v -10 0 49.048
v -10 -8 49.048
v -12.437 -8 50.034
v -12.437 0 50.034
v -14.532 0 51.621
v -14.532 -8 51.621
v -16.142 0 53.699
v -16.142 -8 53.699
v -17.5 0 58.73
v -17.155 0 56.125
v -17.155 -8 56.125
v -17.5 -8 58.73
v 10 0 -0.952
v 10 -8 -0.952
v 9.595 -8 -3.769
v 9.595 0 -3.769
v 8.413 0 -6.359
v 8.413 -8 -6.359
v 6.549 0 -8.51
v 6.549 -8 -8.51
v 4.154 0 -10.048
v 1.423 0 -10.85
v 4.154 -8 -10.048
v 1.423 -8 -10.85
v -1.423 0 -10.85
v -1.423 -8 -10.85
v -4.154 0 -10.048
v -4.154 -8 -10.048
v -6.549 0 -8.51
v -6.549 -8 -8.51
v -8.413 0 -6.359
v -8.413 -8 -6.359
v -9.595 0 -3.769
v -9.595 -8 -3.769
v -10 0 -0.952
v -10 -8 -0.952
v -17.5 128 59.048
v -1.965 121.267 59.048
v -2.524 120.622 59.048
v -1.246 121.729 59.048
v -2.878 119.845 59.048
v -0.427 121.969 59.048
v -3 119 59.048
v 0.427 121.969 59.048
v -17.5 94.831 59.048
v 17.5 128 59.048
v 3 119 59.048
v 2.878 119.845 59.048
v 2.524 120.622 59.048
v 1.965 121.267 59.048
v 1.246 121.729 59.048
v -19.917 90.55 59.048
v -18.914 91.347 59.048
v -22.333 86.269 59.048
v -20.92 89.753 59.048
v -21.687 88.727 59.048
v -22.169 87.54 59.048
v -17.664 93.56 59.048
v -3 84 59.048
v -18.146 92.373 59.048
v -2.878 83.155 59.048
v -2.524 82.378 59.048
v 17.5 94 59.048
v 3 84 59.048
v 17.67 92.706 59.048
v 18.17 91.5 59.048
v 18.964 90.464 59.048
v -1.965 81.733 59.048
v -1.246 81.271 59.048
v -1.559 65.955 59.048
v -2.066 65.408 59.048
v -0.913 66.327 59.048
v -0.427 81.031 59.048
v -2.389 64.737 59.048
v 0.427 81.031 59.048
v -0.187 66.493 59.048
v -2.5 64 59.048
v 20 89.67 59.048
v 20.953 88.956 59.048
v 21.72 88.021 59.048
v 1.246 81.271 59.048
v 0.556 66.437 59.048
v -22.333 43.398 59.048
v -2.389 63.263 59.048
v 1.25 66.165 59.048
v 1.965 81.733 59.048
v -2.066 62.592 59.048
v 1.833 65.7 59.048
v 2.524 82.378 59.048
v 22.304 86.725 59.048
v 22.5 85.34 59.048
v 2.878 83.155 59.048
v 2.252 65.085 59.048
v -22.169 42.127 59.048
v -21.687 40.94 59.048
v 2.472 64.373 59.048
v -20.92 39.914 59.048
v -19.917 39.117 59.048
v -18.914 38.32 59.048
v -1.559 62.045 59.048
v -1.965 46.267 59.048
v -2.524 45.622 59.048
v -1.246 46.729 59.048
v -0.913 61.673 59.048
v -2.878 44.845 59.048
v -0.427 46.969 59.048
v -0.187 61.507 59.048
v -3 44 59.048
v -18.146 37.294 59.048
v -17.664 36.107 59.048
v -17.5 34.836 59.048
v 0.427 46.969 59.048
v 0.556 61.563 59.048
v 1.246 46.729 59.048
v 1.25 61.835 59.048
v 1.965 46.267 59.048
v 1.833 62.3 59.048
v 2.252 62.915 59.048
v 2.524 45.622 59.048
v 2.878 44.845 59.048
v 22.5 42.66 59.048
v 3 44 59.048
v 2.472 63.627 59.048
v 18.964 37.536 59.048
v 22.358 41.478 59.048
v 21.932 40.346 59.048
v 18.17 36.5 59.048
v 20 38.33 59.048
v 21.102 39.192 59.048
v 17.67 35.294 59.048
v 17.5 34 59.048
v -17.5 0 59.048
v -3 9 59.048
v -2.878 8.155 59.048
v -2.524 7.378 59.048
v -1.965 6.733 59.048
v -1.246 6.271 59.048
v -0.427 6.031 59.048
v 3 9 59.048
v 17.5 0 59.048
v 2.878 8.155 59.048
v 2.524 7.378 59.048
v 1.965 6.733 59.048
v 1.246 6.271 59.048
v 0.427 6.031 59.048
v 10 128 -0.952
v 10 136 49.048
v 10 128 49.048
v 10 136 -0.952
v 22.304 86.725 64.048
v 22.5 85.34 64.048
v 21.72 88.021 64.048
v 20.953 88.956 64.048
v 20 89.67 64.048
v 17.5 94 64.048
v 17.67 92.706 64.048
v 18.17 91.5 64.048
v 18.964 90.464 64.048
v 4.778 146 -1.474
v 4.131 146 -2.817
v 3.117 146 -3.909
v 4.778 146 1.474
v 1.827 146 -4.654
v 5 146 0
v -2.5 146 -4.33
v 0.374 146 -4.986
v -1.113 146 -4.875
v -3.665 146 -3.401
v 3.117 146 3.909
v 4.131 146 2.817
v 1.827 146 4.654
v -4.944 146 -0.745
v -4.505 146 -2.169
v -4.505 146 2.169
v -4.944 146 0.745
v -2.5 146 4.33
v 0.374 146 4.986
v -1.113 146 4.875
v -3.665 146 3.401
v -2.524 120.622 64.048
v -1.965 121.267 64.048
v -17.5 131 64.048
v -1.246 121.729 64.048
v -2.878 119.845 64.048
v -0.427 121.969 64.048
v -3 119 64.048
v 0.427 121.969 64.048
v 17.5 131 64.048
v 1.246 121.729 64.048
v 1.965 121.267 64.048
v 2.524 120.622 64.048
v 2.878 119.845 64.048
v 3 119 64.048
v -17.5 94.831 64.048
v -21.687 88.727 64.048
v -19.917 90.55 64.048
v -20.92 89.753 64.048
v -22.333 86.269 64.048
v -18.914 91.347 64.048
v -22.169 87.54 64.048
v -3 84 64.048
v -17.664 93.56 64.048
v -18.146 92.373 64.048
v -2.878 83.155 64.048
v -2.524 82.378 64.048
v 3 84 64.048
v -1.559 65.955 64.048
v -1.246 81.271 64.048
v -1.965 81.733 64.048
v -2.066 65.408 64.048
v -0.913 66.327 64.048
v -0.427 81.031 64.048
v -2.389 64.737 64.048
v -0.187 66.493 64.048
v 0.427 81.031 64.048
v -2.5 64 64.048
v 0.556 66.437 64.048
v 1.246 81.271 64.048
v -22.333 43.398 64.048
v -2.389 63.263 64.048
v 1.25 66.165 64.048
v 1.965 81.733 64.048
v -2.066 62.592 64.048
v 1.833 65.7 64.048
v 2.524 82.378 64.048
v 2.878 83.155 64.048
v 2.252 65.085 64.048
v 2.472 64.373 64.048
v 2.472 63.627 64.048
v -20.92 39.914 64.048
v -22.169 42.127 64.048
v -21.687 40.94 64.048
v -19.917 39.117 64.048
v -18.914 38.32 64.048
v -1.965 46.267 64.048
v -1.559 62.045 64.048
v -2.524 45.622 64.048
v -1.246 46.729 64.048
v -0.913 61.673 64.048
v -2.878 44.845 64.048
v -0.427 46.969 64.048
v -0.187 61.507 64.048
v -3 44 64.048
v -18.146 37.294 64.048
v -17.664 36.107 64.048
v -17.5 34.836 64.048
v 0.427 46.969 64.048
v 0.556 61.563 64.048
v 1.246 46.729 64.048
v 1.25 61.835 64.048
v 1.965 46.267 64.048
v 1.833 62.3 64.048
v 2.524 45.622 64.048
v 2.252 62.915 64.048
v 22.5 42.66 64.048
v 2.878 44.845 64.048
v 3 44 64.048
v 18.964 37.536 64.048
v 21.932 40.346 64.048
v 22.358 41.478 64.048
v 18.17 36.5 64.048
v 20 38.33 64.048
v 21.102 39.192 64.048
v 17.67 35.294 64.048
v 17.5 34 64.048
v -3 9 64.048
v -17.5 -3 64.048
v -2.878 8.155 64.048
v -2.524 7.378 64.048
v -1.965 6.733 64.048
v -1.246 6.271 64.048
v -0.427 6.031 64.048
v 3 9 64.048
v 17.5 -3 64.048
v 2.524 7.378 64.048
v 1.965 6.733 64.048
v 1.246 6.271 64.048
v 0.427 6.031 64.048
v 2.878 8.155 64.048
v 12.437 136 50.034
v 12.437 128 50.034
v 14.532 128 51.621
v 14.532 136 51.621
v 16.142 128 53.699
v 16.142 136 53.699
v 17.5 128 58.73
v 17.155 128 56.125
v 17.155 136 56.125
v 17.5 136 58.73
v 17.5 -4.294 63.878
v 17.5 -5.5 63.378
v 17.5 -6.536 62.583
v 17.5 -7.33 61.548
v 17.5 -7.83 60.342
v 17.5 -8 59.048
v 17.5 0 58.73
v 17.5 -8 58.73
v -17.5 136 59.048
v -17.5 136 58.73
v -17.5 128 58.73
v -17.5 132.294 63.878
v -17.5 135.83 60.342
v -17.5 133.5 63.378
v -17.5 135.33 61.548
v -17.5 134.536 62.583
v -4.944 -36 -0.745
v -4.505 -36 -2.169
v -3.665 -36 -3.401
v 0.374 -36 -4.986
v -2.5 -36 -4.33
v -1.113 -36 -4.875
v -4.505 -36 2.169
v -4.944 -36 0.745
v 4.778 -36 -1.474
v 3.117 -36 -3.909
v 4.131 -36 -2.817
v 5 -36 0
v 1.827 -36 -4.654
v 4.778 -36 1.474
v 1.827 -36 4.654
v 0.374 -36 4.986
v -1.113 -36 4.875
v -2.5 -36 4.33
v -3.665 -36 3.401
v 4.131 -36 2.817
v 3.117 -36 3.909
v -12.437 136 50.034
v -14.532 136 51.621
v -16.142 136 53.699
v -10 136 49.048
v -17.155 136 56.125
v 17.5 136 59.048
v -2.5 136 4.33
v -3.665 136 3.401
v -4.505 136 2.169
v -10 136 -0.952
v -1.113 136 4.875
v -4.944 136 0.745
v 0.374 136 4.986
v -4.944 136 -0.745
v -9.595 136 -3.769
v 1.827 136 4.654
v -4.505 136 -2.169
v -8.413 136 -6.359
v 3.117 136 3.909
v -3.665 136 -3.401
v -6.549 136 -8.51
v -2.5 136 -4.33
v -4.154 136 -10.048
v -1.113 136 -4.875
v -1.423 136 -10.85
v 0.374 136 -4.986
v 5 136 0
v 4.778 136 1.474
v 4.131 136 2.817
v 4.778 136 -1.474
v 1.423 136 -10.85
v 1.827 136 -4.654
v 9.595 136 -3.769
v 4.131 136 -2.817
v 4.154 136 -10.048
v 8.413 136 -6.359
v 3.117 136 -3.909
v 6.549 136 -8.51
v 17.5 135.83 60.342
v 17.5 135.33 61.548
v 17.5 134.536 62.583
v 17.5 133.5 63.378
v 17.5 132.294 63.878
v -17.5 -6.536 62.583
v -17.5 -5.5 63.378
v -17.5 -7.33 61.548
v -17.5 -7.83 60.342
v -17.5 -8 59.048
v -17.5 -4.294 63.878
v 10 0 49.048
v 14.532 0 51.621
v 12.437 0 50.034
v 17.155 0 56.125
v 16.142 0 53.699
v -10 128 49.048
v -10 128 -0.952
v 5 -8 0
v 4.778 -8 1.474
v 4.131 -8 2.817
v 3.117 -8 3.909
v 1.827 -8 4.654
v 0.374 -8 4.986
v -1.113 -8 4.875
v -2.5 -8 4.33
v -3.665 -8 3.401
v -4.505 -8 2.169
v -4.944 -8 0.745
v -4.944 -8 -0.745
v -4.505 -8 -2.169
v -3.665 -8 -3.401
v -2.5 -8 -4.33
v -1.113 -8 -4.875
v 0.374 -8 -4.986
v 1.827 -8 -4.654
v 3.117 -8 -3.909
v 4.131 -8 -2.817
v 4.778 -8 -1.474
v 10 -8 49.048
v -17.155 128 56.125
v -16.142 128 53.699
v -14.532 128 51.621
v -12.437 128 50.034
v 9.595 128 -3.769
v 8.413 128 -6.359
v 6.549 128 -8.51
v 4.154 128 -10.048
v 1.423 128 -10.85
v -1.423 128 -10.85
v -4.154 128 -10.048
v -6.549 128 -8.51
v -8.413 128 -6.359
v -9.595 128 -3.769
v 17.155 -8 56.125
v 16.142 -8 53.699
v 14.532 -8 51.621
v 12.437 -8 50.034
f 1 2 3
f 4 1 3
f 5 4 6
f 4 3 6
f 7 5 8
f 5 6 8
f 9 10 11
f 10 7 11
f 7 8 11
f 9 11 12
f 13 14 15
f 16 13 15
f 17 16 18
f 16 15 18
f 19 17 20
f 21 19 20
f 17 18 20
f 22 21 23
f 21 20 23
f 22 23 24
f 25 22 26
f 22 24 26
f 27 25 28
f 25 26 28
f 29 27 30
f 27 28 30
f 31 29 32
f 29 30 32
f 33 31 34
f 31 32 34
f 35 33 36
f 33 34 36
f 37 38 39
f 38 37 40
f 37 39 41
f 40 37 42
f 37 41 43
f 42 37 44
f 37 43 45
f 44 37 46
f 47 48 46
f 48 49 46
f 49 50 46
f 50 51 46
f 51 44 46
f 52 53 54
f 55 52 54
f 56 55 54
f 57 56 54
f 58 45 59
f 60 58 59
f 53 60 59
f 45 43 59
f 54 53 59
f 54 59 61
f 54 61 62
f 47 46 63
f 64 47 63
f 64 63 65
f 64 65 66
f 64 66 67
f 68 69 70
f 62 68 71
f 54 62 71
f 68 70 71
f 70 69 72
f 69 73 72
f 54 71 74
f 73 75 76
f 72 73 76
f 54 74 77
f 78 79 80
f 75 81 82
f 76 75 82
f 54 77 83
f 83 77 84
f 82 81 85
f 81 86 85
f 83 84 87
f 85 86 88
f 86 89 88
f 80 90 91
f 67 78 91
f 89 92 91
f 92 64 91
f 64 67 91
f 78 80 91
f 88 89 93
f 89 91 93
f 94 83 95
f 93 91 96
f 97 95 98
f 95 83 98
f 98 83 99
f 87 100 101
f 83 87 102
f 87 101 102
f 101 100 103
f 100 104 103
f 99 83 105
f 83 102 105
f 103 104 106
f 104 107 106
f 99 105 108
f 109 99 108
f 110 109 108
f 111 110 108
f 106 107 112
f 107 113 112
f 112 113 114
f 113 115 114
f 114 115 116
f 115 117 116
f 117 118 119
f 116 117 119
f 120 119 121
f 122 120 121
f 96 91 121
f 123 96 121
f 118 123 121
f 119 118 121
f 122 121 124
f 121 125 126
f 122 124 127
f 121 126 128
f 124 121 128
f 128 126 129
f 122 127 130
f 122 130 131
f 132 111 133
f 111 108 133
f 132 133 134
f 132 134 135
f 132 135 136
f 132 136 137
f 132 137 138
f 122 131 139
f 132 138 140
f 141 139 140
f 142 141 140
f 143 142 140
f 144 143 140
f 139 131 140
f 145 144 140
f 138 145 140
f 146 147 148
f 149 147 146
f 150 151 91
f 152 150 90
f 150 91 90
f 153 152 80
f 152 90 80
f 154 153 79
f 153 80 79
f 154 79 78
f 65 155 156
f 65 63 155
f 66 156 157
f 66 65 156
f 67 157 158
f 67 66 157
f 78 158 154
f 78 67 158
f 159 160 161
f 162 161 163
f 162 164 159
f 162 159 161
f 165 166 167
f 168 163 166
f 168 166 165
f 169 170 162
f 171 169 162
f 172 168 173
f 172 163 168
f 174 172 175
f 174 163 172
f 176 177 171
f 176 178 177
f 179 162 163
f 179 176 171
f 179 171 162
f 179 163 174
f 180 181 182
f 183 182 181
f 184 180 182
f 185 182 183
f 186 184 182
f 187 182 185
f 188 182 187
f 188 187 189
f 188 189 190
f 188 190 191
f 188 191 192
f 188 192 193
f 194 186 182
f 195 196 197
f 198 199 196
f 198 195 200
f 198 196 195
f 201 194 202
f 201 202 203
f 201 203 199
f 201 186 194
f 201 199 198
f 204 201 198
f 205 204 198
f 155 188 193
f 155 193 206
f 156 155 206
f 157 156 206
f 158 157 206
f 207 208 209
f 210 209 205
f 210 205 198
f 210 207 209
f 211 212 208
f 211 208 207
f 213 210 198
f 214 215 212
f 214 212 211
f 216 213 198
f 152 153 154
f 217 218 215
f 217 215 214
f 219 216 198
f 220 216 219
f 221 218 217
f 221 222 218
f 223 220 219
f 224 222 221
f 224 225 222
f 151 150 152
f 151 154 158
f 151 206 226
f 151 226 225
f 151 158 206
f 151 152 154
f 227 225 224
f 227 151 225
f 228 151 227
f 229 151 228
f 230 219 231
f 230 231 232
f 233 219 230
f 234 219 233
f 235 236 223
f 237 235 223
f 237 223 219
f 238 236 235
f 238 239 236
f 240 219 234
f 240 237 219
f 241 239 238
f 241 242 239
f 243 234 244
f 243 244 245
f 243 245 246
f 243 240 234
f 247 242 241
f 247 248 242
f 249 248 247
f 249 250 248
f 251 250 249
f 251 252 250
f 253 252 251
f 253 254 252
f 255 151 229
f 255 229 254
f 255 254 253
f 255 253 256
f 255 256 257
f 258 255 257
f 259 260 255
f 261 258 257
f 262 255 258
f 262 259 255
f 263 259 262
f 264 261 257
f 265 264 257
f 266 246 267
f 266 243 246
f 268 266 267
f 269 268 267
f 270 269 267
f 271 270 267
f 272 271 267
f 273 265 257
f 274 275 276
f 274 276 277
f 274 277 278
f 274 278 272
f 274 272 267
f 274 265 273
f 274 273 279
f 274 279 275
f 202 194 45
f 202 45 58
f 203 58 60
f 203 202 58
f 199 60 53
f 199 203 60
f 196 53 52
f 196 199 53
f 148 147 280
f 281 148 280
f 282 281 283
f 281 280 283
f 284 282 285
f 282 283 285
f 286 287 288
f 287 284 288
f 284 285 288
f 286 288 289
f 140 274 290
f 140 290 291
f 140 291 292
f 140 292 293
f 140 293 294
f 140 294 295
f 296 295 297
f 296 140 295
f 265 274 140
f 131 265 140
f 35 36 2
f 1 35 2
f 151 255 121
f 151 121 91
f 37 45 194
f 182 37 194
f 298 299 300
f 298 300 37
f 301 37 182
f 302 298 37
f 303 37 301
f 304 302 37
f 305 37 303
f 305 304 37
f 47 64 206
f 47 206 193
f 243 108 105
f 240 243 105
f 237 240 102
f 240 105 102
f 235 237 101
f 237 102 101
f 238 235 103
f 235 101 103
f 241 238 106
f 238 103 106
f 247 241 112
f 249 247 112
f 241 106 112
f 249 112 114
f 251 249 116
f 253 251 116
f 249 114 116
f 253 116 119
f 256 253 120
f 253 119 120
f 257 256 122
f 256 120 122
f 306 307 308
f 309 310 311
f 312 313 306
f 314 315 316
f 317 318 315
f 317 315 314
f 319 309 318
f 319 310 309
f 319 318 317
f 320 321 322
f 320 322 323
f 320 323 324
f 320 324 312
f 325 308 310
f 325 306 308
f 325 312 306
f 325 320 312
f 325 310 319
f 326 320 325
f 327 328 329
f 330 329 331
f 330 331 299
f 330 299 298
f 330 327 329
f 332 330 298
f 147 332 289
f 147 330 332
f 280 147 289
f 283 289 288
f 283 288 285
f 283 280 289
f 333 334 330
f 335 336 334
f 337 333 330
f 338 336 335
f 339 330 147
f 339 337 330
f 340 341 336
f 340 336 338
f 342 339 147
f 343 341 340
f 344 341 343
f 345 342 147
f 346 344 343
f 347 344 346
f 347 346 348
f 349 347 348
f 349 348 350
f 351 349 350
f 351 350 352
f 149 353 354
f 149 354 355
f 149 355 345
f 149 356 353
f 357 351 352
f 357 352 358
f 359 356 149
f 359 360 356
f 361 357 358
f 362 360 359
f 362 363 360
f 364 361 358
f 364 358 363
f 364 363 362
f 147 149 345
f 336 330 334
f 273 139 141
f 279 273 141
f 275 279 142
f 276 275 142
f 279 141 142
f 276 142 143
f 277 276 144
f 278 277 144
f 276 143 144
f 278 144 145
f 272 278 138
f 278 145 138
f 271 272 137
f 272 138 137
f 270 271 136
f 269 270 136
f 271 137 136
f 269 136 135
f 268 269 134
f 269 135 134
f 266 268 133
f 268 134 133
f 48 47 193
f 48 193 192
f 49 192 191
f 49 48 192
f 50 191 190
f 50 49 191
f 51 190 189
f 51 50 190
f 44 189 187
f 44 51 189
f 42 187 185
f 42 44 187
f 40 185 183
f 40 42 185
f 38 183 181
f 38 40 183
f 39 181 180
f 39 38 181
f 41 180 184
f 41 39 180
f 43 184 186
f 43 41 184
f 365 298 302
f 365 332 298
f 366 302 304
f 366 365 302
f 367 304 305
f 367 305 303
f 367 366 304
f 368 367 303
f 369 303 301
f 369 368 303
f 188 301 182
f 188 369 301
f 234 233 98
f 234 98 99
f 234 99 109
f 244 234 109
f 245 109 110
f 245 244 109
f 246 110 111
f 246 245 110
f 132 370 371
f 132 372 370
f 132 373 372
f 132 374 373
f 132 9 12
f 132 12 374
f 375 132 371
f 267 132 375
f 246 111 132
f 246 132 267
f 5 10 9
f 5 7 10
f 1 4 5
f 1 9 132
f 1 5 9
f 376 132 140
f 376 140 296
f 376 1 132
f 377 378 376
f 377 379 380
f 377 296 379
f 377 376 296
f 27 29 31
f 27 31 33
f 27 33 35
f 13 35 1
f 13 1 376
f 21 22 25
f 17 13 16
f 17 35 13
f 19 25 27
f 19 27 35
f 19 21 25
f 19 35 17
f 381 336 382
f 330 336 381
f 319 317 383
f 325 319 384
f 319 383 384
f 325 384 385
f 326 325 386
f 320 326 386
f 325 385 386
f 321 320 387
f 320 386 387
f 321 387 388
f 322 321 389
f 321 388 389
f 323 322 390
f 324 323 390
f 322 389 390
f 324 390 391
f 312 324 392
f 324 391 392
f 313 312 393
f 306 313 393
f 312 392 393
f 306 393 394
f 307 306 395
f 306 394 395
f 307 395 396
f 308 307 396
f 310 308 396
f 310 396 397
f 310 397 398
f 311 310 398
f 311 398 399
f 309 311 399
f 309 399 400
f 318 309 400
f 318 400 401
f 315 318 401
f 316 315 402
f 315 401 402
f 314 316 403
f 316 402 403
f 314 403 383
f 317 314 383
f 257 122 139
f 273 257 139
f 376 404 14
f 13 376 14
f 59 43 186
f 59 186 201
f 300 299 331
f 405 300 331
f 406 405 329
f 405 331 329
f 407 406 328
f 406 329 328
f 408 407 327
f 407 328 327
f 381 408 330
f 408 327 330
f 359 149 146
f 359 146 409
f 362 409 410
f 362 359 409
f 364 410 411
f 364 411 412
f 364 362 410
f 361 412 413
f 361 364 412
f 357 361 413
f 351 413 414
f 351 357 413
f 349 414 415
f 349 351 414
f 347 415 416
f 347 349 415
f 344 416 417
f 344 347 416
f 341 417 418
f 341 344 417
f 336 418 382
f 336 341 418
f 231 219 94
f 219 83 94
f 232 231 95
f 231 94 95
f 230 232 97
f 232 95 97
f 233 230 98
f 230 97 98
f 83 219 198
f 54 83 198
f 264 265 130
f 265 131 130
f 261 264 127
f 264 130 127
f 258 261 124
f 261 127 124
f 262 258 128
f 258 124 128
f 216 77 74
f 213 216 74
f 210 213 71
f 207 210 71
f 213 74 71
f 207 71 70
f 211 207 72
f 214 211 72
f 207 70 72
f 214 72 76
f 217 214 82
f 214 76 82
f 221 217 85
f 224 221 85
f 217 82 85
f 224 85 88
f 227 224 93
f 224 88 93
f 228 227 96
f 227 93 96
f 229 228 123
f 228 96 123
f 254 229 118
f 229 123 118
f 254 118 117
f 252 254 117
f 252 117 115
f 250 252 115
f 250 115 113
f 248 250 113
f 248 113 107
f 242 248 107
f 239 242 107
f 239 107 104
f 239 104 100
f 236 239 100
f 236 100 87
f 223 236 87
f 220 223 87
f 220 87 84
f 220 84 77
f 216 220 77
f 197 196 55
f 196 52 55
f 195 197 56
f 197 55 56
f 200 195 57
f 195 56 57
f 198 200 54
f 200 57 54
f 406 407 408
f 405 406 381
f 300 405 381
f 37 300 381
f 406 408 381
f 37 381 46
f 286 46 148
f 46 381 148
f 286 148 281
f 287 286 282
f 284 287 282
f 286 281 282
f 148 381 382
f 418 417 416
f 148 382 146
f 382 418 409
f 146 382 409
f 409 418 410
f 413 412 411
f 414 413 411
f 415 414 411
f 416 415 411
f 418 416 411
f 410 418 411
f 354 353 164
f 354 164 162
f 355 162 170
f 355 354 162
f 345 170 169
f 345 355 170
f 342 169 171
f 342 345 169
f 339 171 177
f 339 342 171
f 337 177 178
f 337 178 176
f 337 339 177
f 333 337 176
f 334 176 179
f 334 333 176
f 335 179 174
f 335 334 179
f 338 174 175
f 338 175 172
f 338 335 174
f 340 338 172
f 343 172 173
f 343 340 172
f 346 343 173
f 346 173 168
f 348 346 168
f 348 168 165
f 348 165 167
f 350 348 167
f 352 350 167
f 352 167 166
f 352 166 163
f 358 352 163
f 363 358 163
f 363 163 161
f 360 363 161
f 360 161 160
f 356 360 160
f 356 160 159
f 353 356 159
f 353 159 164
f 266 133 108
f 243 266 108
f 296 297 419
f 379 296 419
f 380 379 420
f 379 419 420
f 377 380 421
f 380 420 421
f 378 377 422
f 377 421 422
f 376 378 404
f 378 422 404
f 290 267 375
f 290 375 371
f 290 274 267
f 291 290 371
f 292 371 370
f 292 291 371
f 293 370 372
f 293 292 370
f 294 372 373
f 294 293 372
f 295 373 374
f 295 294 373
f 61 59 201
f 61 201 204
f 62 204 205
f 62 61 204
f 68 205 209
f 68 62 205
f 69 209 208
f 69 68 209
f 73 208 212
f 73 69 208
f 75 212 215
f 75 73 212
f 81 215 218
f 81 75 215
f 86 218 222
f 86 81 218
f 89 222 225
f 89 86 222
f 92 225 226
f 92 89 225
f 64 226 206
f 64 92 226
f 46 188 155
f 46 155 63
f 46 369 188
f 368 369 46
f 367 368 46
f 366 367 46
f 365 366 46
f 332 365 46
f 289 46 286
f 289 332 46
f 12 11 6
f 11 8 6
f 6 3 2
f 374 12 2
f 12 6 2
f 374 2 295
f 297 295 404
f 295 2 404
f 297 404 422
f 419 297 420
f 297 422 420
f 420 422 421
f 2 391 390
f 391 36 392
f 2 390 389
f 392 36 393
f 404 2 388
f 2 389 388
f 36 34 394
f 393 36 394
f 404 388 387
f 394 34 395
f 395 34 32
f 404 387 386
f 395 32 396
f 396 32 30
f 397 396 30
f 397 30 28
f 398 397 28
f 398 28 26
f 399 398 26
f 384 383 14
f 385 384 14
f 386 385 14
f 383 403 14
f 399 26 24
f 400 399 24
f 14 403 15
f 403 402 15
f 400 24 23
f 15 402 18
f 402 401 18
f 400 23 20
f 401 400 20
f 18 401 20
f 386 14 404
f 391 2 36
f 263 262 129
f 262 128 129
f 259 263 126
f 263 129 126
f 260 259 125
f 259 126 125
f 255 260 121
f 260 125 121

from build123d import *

# Parameters (mm, degrees)
SKETCH1_W             = 144
SKETCH1_H             = 35
BOSS_EXTRUDE1_DEPTH   = 5
BOSS_EXTRUDE2_DEPTH   = 8
FILLET1_R             = 10
BOSS_EXTRUDE3_DEPTH   = 8
SKETCH5_R             = 5
BOSS_EXTRUDE4_DEPTH   = 28
FILLET1_OF_MIRROR1_R  = 10
FILLET3_R             = 5
SKETCH7_R             = 2.5
CUT_EXTRUDE2_DEPTH    = 28
SKETCH8_R             = 5
CUT_EXTRUDE3_DEPTH    = 18
SKETCH9_W             = 50
SKETCH9_H             = 4.833302034
BOSS_EXTRUDE7_DEPTH   = 5
FILLET6_R             = 5
FILLET7_R             = 5
SKETCH10_W            = 50
SKETCH10_H            = 5
BOSS_EXTRUDE8_DEPTH   = 5
FILLET8_R             = 5
FILLET9_R             = 5
CUT_EXTRUDE6_DEPTH    = 10
BODY_MOVE_COPY1_ANGLE = 120


with BuildPart() as part:
    # Sketch1 → Boss-Extrude1 (new body)
    with BuildSketch(Plane(origin=(0, 0, 0), x_dir=(1, 0, 0), z_dir=(0, 1, 0))):
        Rectangle(SKETCH1_W, SKETCH1_H)
    boss_extrude1 = extrude(amount=BOSS_EXTRUDE1_DEPTH)

    # Sketch3 → Boss-Extrude2 (add)
    with BuildSketch(Plane.ZY.offset(72)):
        Polygon((-17.5, 5), (-17.5, 15), (-10, 15), (-10, 55), (10, 55), (10, 15), (17.5, 15), (17.5, 5), (0, 5), align=None)
    boss_extrude2 = extrude(amount=-BOSS_EXTRUDE2_DEPTH)

    # Fillet1
    # the kernel refuses this fillet: 10 mm, written as the material it takes off along each edge
    with BuildSketch(Plane(origin=(-96.206145914, 15, -17.5), x_dir=(0, -1, 0), z_dir=(1, 0, 0))) as fillet1_piece_1:
        with BuildLine():
            CenterArc((9.682458366, -10), FILLET1_R, 90, 75.522487814)
            Line((0, -7.5), (-0.193649167, -7.45))
            ThreePointArc((-0.193649167, -7.45), (-0.2, -3.75), (-0.2, 0))
            Line((-0.2, 0), (0, 0.2))
            Line((0, 0.2), (9.682458366, 0.2))
            Line((9.682458366, 0.2), (9.682458366, 0))
        make_face()
    extrude(amount=56.412291828, mode=Mode.SUBTRACT)
    with BuildSketch(Plane(origin=(-96.206145914, 15, 17.5), x_dir=(0, -1, 0), z_dir=(1, 0, 0))) as fillet1_piece_2:
        with BuildLine():
            CenterArc((9.682458366, 10), FILLET1_R, 194.477512186, 75.522487814)
            Line((0, 7.5), (-0.193649167, 7.45))
            ThreePointArc((-0.193649167, 7.45), (-0.2, 3.75), (-0.2, 0))
            Line((-0.2, 0), (0, -0.2))
            Line((0, -0.2), (9.682458366, -0.2))
            Line((9.682458366, -0.2), (9.682458366, 0))
        make_face()
    extrude(amount=56.412291828, mode=Mode.SUBTRACT)

    # Sketch4 → Boss-Extrude3 (add)
    with BuildSketch(Plane.ZY.offset(72)):
        with BuildLine():
            Line((-10, 55), (-10, 65))
            ThreePointArc((-10, 65), (0, 75), (10, 65))
            Line((10, 65), (10, 55))
            Line((10, 55), (-10, 55))
        make_face()
    boss_extrude3 = extrude(amount=-BOSS_EXTRUDE3_DEPTH)

    # Sketch5 → Boss-Extrude4 (add)
    with BuildSketch(Plane.ZY.offset(72)):
        with Locations(Location((0, 64.047898896, 0), (0, 0, 180))):
            Circle(SKETCH5_R)
    boss_extrude4 = extrude(amount=BOSS_EXTRUDE4_DEPTH)

    # Mirror1: Boss-Extrude1, Boss-Extrude2, Boss-Extrude3, Boss-Extrude4 across plane
    add(boss_extrude1.mirror(Plane(origin=(0, 0, 0), x_dir=(0, 0, 1), z_dir=(1, 0, 0))))
    add(boss_extrude2.mirror(Plane(origin=(0, 0, 0), x_dir=(0, 0, 1), z_dir=(1, 0, 0))))
    add(boss_extrude3.mirror(Plane(origin=(0, 0, 0), x_dir=(0, 0, 1), z_dir=(1, 0, 0))))
    add(boss_extrude4.mirror(Plane(origin=(0, 0, 0), x_dir=(0, 0, 1), z_dir=(1, 0, 0))))

    # Fillet1 of Mirror1
    # the kernel refuses this fillet: 10 mm, written as the material it takes off along each edge
    with BuildSketch(Plane(origin=(96.206145914, 15, -17.5), x_dir=(0, -1, 0), z_dir=(-1, 0, 0))) as fillet1_of_mirror1_piece_1:
        with BuildLine():
            CenterArc((9.682458366, 10), FILLET1_OF_MIRROR1_R, 194.477512186, 75.522487814)
            Line((0, 7.5), (-0.193649167, 7.45))
            ThreePointArc((-0.193649167, 7.45), (-0.2, 3.75), (-0.2, 0))
            Line((-0.2, 0), (0, -0.2))
            Line((0, -0.2), (9.682458366, -0.2))
            Line((9.682458366, -0.2), (9.682458366, 0))
        make_face()
    extrude(amount=56.412291828, mode=Mode.SUBTRACT)
    with BuildSketch(Plane(origin=(96.206145914, 15, 17.5), x_dir=(0, -1, 0), z_dir=(-1, 0, 0))) as fillet1_of_mirror1_piece_2:
        with BuildLine():
            CenterArc((9.682458366, -10), FILLET1_OF_MIRROR1_R, 90, 75.522487814)
            Line((0, -7.5), (-0.193649167, -7.45))
            ThreePointArc((-0.193649167, -7.45), (-0.2, -3.75), (-0.2, 0))
            Line((-0.2, 0), (0, 0.2))
            Line((0, 0.2), (9.682458366, 0.2))
            Line((9.682458366, 0.2), (9.682458366, 0))
        make_face()
    extrude(amount=56.412291828, mode=Mode.SUBTRACT)

    # Fillet3
    fillet3_edges = [part.edges().sort_by_distance(p)[0] for p in [
        (-72, 0, 0),
        (72, 0, 0),
    ]]
    fillet(fillet3_edges, radius=FILLET3_R)

    # Sketch7 → Cut-Extrude2 (cut)
    with BuildSketch(Plane(origin=(0, 5, 0), x_dir=(1, 0, 0), z_dir=(0, 1, 0))):
        with Locations(Location((0, 0, 0), (0, 0, 270))):
            Circle(SKETCH7_R)
    extrude(amount=-CUT_EXTRUDE2_DEPTH, mode=Mode.SUBTRACT)

    # Sketch8 → Cut-Extrude3 (cut)
    with BuildSketch(Plane(origin=(100, 0, 0), x_dir=(0, 0, -1), z_dir=(1, 0, 0))):
        with Locations(Location((0, 64.047898896, 0), (0, 0, 180))):
            Circle(SKETCH8_R)
    extrude(amount=-CUT_EXTRUDE3_DEPTH, mode=Mode.SUBTRACT)

    # Sketch9 → Boss-Extrude7 (add)
    with BuildSketch(Plane.XZ):
        with Locations((0.833489832, 19.916651017)):
            Rectangle(SKETCH9_W, SKETCH9_H)
    extrude(amount=-BOSS_EXTRUDE7_DEPTH)

    # Fillet6
    # the kernel refuses this fillet: 5 mm, written as the material it adds along each edge
    with BuildSketch(Plane(origin=(-24.166510168, 0, 17.5), x_dir=(-1, 0, 0), z_dir=(0, 1, 0))) as fillet6_piece_1:
        with BuildLine():
            CenterArc((4.997220406, 5), FILLET6_R, 181.91057204, 88.08942796)
            Line((0, 4.833302034), (-0.099944408, 4.829968074))
            ThreePointArc((-0.099944408, 4.829968074), (-0.1, 2.416651017), (-0.1, 0))
            Line((-0.1, 0), (0, -0.1))
            Line((0, -0.1), (4.997220406, -0.1))
            Line((4.997220406, -0.1), (4.997220406, 0))
        make_face()
    extrude(amount=5)
    with BuildSketch(Plane(origin=(25.833489832, 0, 17.5), x_dir=(1, 0, 0), z_dir=(0, 1, 0))) as fillet6_piece_2:
        with BuildLine():
            CenterArc((4.997220406, -5), FILLET6_R, 90, 88.08942796)
            Line((0, -4.833302034), (-0.099944408, -4.829968074))
            ThreePointArc((-0.099944408, -4.829968074), (-0.1, -2.416651017), (-0.1, 0))
            Line((-0.1, 0), (0, 0.1))
            Line((0, 0.1), (4.997220406, 0.1))
            Line((4.997220406, 0.1), (4.997220406, 0))
        make_face()
    extrude(amount=5)

    # Fillet7
    fillet7_edges = [part.edges().sort_by_distance(p)[0] for p in [
        (-24.166510168, 2.5, 22.333302034),
        (25.833489832, 2.5, 22.333302034),
    ]]
    fillet(fillet7_edges, radius=FILLET7_R)

    # Sketch10 → Boss-Extrude8 (add)
    with BuildSketch(Plane.XZ):
        with Locations((0, -20)):
            Rectangle(SKETCH10_W, SKETCH10_H)
    extrude(amount=-BOSS_EXTRUDE8_DEPTH)

    # Fillet8
    fillet8_edges = [part.edges().sort_by_distance(p)[0] for p in [
        (-25, 2.5, -17.5),
        (25, 2.5, -17.5),
    ]]
    fillet(fillet8_edges, radius=FILLET8_R - 0.0001)  # a hair under: the kernel refuses the full size

    # Fillet9
    fillet9_edges = [part.edges().sort_by_distance(p)[0] for p in [
        (-25, 2.5, -22.5),
        (25, 2.5, -22.5),
    ]]
    fillet(fillet9_edges, radius=FILLET9_R)

    # Sketch11 → Cut-Extrude6 (cut)
    with BuildSketch(Plane(origin=(0, 5, 0), x_dir=(1, 0, 0), z_dir=(0, 1, 0))):
        with BuildLine():
            Line((55, -3), (20, -3))
            ThreePointArc((20, -3), (17, 0), (20, 3))
            Line((20, 3), (55, 3))
            ThreePointArc((55, 3), (58, 0), (55, -3))
        make_face()
        with BuildLine():
            Line((-55, -3), (-20, -3))
            ThreePointArc((-20, -3), (-17, 0), (-20, 3))
            Line((-20, 3), (-55, 3))
            ThreePointArc((-55, 3), (-58, 0), (-55, -3))
        make_face()
    extrude(amount=-CUT_EXTRUDE6_DEPTH, mode=Mode.SUBTRACT)


with BuildPart() as part_1:
    # Body-Move/Copy1: read off the stored shape, not the designer's step
    # Body-Move/Copy1: moved
    add(part.part.moved(Location((64, -64.0478989, 0))).rotate(Axis((0, 0, 0), (-0.5773502692, -0.5773502692, 0.5773502692)), BODY_MOVE_COPY1_ANGLE))


solid = part_1.part
